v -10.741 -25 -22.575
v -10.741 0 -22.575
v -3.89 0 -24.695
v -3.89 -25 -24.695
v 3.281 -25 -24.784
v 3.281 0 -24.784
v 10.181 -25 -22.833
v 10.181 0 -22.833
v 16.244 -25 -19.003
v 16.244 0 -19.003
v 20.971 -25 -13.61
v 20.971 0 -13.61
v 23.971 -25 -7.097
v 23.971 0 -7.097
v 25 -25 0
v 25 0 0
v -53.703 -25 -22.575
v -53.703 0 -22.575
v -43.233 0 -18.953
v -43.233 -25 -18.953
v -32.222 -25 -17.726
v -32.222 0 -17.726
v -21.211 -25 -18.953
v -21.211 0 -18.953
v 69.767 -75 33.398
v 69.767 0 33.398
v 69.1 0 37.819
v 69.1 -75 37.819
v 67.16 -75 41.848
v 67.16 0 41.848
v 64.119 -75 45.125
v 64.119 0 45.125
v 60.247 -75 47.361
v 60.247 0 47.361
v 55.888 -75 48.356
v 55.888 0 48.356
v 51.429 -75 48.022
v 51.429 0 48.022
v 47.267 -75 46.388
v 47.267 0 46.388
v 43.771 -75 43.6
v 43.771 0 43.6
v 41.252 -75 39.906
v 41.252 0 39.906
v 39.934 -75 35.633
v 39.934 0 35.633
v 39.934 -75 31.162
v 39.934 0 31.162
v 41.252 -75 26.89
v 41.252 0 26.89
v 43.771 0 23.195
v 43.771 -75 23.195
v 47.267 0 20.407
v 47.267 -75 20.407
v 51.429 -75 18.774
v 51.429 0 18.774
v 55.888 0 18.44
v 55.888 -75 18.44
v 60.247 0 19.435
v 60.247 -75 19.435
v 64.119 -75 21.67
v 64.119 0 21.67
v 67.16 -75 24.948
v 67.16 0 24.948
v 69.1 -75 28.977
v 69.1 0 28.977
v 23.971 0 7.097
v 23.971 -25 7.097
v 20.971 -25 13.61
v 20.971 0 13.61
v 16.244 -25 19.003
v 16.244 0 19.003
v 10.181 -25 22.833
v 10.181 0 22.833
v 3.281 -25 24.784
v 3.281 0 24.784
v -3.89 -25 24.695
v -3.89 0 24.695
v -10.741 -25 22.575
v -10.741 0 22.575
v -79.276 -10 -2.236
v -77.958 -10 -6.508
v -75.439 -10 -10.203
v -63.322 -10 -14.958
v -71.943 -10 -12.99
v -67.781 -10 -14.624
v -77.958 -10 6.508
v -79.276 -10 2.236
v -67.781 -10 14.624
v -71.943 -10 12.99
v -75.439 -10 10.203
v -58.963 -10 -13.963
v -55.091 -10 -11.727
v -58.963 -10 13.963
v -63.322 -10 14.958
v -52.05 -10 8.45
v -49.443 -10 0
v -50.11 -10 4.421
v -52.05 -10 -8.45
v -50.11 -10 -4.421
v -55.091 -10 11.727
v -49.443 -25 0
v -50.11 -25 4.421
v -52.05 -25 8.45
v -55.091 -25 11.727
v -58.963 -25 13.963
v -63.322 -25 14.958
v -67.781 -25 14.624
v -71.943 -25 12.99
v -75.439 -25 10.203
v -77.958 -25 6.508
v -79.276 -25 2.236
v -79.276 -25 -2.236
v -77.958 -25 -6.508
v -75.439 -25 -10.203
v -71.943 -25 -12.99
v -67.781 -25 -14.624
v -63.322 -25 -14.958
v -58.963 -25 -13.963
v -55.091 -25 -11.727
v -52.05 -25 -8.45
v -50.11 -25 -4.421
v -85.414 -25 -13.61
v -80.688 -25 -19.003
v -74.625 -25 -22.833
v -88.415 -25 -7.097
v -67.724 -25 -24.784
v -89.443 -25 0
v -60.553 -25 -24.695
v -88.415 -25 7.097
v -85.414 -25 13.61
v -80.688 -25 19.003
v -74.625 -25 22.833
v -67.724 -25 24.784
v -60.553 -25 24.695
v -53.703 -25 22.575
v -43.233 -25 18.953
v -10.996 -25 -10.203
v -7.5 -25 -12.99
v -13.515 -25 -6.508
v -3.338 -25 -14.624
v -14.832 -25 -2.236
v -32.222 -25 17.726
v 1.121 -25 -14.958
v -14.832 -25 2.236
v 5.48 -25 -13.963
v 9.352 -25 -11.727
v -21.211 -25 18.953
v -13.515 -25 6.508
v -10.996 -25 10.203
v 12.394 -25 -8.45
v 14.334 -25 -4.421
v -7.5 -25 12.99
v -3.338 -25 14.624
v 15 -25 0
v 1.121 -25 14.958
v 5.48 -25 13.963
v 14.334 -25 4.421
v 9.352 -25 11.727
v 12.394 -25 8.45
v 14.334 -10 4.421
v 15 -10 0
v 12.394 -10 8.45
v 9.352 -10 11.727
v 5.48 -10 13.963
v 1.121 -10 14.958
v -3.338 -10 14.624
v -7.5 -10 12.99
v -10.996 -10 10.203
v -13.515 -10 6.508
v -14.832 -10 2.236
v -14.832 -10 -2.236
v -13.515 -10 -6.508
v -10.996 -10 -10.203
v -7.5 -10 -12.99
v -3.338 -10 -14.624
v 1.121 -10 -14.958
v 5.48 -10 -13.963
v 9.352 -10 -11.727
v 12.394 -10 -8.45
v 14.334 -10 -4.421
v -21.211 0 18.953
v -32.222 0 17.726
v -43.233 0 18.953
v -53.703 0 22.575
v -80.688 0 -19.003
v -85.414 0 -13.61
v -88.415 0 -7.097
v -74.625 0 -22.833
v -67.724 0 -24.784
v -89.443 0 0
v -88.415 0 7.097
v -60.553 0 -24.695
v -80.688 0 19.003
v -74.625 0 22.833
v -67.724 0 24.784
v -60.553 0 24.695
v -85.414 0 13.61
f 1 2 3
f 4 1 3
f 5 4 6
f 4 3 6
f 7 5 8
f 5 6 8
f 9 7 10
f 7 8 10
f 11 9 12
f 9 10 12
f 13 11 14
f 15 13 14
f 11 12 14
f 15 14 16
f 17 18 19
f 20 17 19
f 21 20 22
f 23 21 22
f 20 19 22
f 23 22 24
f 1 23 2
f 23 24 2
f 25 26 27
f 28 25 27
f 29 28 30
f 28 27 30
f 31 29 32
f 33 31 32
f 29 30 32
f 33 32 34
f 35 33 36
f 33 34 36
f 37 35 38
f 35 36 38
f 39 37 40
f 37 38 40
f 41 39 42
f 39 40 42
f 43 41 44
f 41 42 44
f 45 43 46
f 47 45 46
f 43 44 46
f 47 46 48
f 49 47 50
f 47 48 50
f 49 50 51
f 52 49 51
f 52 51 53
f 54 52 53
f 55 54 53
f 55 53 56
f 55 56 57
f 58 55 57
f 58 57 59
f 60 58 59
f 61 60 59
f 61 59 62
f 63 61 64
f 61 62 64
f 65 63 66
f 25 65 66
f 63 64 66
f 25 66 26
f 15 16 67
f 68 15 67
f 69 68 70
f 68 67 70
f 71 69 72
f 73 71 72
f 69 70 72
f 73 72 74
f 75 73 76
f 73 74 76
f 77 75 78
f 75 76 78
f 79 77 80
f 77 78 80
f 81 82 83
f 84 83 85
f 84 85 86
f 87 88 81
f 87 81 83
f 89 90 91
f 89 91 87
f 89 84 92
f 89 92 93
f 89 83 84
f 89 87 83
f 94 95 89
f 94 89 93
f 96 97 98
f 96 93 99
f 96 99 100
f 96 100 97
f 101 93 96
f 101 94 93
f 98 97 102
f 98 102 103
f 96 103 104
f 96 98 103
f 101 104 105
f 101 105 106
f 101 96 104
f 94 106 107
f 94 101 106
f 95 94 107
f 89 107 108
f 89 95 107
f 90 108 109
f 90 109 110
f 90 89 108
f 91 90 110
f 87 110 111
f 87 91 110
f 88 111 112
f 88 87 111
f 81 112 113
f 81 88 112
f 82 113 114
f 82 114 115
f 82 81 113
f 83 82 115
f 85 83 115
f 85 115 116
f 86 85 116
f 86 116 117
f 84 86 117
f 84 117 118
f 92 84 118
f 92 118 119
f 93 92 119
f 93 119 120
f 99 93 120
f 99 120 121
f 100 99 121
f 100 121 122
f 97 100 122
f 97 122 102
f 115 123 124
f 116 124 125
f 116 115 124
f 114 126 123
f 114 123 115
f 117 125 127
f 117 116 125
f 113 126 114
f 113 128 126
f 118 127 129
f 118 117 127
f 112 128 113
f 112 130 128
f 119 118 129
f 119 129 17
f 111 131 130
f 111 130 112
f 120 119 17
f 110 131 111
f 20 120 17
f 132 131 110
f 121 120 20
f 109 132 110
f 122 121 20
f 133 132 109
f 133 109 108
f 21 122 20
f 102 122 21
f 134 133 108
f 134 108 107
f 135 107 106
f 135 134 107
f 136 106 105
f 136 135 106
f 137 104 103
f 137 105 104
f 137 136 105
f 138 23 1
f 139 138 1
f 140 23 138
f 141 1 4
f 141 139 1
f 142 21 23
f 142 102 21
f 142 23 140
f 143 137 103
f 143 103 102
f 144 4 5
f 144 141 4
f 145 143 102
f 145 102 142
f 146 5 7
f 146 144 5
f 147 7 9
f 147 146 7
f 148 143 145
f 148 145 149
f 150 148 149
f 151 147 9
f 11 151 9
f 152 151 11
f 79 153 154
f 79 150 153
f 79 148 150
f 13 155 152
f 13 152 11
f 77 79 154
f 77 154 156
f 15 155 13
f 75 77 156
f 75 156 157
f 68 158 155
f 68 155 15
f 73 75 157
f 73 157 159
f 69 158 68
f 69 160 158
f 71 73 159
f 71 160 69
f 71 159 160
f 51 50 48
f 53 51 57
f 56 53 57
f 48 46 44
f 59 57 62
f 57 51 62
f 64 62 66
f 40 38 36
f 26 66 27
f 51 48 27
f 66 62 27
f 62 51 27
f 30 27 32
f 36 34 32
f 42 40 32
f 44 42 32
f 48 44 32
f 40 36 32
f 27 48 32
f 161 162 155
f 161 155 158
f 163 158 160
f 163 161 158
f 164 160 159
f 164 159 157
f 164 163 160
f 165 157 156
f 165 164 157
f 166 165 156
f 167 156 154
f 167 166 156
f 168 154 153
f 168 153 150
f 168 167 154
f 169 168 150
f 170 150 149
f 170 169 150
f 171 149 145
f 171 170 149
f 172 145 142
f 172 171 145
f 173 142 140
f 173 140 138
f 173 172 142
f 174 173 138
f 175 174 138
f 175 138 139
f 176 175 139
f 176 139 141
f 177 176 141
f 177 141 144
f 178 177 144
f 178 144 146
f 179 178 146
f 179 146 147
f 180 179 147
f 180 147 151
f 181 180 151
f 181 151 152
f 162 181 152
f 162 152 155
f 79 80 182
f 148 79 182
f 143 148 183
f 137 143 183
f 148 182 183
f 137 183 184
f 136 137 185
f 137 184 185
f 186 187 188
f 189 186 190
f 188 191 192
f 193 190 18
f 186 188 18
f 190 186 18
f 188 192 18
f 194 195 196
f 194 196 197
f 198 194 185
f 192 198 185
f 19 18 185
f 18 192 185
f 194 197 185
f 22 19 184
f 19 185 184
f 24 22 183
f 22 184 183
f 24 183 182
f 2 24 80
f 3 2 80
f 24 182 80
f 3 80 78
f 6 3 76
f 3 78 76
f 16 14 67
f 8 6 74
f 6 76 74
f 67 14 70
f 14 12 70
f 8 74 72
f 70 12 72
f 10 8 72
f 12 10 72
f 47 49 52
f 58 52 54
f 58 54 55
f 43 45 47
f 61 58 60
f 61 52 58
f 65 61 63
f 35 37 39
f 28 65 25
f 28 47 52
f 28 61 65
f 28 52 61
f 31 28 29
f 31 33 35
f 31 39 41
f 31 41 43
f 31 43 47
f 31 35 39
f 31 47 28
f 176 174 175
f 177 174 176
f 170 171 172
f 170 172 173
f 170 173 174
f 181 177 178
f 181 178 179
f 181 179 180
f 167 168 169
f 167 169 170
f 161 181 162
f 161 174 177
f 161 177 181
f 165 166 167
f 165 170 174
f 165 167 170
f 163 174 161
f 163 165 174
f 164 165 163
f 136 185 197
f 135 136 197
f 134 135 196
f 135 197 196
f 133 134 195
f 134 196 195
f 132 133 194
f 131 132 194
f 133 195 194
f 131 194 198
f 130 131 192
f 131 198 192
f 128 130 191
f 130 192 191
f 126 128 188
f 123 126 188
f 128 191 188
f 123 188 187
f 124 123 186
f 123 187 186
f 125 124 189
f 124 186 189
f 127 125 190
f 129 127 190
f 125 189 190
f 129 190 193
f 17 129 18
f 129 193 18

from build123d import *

# Parameters (mm, degrees)
F0_R     = 15
F1_DEPTH = 25
F2_DEPTH = 10
F3_R     = 15
F4_DEPTH = 75


with BuildPart() as f1:
    # F0 (on Front) → F1 (new body)
    with BuildSketch(Plane.XZ):
        with BuildLine():
            ThreePointArc((-39.443385, 0), (-43.306757, 13.350766), (-53.702821, 22.575214))
            ThreePointArc((-53.702821, 22.575214), (-89.443385, 0), (-53.702821, -22.575214))
            ThreePointArc((-53.702821, -22.575214), (-43.306757, -13.350766), (-39.443385, 0))
        make_face()
        with Locations((-64.443385, 0)):
            Circle(F0_R, mode=Mode.SUBTRACT)
        with BuildLine():
            ThreePointArc((-10.740564, -22.575214), (-25, 0), (-10.740564, 22.575214))
            ThreePointArc((-10.740564, 22.575214), (-32.221692, 17.725642), (-53.702821, 22.575214))
            ThreePointArc((-53.702821, 22.575214), (-43.306757, 13.350766), (-39.443385, 0))
            ThreePointArc((-39.443385, 0), (-43.306757, -13.350766), (-53.702821, -22.575214))
            ThreePointArc((-53.702821, -22.575214), (-32.221692, -17.725642), (-10.740564, -22.575214))
        make_face()
        with BuildLine():
            ThreePointArc((-10.740564, -22.575214), (13.350766, -21.136628), (25, 0))
            ThreePointArc((25, 0), (13.350766, 21.136628), (-10.740564, 22.575214))
            ThreePointArc((-10.740564, 22.575214), (-25, 0), (-10.740564, -22.575214))
        make_face()
        Circle(F0_R, mode=Mode.SUBTRACT)
    extrude(amount=F1_DEPTH)

    # F0 (on Front) → F2 (join)
    with BuildSketch(Plane.XZ):
        Circle(F0_R)
        with Locations((-64.443385, 0)):
            Circle(F0_R)
    extrude(amount=F2_DEPTH)


with BuildPart() as f4:
    # F3 (on Front) → F4 (new body)
    with BuildSketch(Plane.XZ):
        with Locations((54.766618, 33.397865)):
            Circle(F3_R)
    extrude(amount=F4_DEPTH)


solid = Compound([f1.part, f4.part])
